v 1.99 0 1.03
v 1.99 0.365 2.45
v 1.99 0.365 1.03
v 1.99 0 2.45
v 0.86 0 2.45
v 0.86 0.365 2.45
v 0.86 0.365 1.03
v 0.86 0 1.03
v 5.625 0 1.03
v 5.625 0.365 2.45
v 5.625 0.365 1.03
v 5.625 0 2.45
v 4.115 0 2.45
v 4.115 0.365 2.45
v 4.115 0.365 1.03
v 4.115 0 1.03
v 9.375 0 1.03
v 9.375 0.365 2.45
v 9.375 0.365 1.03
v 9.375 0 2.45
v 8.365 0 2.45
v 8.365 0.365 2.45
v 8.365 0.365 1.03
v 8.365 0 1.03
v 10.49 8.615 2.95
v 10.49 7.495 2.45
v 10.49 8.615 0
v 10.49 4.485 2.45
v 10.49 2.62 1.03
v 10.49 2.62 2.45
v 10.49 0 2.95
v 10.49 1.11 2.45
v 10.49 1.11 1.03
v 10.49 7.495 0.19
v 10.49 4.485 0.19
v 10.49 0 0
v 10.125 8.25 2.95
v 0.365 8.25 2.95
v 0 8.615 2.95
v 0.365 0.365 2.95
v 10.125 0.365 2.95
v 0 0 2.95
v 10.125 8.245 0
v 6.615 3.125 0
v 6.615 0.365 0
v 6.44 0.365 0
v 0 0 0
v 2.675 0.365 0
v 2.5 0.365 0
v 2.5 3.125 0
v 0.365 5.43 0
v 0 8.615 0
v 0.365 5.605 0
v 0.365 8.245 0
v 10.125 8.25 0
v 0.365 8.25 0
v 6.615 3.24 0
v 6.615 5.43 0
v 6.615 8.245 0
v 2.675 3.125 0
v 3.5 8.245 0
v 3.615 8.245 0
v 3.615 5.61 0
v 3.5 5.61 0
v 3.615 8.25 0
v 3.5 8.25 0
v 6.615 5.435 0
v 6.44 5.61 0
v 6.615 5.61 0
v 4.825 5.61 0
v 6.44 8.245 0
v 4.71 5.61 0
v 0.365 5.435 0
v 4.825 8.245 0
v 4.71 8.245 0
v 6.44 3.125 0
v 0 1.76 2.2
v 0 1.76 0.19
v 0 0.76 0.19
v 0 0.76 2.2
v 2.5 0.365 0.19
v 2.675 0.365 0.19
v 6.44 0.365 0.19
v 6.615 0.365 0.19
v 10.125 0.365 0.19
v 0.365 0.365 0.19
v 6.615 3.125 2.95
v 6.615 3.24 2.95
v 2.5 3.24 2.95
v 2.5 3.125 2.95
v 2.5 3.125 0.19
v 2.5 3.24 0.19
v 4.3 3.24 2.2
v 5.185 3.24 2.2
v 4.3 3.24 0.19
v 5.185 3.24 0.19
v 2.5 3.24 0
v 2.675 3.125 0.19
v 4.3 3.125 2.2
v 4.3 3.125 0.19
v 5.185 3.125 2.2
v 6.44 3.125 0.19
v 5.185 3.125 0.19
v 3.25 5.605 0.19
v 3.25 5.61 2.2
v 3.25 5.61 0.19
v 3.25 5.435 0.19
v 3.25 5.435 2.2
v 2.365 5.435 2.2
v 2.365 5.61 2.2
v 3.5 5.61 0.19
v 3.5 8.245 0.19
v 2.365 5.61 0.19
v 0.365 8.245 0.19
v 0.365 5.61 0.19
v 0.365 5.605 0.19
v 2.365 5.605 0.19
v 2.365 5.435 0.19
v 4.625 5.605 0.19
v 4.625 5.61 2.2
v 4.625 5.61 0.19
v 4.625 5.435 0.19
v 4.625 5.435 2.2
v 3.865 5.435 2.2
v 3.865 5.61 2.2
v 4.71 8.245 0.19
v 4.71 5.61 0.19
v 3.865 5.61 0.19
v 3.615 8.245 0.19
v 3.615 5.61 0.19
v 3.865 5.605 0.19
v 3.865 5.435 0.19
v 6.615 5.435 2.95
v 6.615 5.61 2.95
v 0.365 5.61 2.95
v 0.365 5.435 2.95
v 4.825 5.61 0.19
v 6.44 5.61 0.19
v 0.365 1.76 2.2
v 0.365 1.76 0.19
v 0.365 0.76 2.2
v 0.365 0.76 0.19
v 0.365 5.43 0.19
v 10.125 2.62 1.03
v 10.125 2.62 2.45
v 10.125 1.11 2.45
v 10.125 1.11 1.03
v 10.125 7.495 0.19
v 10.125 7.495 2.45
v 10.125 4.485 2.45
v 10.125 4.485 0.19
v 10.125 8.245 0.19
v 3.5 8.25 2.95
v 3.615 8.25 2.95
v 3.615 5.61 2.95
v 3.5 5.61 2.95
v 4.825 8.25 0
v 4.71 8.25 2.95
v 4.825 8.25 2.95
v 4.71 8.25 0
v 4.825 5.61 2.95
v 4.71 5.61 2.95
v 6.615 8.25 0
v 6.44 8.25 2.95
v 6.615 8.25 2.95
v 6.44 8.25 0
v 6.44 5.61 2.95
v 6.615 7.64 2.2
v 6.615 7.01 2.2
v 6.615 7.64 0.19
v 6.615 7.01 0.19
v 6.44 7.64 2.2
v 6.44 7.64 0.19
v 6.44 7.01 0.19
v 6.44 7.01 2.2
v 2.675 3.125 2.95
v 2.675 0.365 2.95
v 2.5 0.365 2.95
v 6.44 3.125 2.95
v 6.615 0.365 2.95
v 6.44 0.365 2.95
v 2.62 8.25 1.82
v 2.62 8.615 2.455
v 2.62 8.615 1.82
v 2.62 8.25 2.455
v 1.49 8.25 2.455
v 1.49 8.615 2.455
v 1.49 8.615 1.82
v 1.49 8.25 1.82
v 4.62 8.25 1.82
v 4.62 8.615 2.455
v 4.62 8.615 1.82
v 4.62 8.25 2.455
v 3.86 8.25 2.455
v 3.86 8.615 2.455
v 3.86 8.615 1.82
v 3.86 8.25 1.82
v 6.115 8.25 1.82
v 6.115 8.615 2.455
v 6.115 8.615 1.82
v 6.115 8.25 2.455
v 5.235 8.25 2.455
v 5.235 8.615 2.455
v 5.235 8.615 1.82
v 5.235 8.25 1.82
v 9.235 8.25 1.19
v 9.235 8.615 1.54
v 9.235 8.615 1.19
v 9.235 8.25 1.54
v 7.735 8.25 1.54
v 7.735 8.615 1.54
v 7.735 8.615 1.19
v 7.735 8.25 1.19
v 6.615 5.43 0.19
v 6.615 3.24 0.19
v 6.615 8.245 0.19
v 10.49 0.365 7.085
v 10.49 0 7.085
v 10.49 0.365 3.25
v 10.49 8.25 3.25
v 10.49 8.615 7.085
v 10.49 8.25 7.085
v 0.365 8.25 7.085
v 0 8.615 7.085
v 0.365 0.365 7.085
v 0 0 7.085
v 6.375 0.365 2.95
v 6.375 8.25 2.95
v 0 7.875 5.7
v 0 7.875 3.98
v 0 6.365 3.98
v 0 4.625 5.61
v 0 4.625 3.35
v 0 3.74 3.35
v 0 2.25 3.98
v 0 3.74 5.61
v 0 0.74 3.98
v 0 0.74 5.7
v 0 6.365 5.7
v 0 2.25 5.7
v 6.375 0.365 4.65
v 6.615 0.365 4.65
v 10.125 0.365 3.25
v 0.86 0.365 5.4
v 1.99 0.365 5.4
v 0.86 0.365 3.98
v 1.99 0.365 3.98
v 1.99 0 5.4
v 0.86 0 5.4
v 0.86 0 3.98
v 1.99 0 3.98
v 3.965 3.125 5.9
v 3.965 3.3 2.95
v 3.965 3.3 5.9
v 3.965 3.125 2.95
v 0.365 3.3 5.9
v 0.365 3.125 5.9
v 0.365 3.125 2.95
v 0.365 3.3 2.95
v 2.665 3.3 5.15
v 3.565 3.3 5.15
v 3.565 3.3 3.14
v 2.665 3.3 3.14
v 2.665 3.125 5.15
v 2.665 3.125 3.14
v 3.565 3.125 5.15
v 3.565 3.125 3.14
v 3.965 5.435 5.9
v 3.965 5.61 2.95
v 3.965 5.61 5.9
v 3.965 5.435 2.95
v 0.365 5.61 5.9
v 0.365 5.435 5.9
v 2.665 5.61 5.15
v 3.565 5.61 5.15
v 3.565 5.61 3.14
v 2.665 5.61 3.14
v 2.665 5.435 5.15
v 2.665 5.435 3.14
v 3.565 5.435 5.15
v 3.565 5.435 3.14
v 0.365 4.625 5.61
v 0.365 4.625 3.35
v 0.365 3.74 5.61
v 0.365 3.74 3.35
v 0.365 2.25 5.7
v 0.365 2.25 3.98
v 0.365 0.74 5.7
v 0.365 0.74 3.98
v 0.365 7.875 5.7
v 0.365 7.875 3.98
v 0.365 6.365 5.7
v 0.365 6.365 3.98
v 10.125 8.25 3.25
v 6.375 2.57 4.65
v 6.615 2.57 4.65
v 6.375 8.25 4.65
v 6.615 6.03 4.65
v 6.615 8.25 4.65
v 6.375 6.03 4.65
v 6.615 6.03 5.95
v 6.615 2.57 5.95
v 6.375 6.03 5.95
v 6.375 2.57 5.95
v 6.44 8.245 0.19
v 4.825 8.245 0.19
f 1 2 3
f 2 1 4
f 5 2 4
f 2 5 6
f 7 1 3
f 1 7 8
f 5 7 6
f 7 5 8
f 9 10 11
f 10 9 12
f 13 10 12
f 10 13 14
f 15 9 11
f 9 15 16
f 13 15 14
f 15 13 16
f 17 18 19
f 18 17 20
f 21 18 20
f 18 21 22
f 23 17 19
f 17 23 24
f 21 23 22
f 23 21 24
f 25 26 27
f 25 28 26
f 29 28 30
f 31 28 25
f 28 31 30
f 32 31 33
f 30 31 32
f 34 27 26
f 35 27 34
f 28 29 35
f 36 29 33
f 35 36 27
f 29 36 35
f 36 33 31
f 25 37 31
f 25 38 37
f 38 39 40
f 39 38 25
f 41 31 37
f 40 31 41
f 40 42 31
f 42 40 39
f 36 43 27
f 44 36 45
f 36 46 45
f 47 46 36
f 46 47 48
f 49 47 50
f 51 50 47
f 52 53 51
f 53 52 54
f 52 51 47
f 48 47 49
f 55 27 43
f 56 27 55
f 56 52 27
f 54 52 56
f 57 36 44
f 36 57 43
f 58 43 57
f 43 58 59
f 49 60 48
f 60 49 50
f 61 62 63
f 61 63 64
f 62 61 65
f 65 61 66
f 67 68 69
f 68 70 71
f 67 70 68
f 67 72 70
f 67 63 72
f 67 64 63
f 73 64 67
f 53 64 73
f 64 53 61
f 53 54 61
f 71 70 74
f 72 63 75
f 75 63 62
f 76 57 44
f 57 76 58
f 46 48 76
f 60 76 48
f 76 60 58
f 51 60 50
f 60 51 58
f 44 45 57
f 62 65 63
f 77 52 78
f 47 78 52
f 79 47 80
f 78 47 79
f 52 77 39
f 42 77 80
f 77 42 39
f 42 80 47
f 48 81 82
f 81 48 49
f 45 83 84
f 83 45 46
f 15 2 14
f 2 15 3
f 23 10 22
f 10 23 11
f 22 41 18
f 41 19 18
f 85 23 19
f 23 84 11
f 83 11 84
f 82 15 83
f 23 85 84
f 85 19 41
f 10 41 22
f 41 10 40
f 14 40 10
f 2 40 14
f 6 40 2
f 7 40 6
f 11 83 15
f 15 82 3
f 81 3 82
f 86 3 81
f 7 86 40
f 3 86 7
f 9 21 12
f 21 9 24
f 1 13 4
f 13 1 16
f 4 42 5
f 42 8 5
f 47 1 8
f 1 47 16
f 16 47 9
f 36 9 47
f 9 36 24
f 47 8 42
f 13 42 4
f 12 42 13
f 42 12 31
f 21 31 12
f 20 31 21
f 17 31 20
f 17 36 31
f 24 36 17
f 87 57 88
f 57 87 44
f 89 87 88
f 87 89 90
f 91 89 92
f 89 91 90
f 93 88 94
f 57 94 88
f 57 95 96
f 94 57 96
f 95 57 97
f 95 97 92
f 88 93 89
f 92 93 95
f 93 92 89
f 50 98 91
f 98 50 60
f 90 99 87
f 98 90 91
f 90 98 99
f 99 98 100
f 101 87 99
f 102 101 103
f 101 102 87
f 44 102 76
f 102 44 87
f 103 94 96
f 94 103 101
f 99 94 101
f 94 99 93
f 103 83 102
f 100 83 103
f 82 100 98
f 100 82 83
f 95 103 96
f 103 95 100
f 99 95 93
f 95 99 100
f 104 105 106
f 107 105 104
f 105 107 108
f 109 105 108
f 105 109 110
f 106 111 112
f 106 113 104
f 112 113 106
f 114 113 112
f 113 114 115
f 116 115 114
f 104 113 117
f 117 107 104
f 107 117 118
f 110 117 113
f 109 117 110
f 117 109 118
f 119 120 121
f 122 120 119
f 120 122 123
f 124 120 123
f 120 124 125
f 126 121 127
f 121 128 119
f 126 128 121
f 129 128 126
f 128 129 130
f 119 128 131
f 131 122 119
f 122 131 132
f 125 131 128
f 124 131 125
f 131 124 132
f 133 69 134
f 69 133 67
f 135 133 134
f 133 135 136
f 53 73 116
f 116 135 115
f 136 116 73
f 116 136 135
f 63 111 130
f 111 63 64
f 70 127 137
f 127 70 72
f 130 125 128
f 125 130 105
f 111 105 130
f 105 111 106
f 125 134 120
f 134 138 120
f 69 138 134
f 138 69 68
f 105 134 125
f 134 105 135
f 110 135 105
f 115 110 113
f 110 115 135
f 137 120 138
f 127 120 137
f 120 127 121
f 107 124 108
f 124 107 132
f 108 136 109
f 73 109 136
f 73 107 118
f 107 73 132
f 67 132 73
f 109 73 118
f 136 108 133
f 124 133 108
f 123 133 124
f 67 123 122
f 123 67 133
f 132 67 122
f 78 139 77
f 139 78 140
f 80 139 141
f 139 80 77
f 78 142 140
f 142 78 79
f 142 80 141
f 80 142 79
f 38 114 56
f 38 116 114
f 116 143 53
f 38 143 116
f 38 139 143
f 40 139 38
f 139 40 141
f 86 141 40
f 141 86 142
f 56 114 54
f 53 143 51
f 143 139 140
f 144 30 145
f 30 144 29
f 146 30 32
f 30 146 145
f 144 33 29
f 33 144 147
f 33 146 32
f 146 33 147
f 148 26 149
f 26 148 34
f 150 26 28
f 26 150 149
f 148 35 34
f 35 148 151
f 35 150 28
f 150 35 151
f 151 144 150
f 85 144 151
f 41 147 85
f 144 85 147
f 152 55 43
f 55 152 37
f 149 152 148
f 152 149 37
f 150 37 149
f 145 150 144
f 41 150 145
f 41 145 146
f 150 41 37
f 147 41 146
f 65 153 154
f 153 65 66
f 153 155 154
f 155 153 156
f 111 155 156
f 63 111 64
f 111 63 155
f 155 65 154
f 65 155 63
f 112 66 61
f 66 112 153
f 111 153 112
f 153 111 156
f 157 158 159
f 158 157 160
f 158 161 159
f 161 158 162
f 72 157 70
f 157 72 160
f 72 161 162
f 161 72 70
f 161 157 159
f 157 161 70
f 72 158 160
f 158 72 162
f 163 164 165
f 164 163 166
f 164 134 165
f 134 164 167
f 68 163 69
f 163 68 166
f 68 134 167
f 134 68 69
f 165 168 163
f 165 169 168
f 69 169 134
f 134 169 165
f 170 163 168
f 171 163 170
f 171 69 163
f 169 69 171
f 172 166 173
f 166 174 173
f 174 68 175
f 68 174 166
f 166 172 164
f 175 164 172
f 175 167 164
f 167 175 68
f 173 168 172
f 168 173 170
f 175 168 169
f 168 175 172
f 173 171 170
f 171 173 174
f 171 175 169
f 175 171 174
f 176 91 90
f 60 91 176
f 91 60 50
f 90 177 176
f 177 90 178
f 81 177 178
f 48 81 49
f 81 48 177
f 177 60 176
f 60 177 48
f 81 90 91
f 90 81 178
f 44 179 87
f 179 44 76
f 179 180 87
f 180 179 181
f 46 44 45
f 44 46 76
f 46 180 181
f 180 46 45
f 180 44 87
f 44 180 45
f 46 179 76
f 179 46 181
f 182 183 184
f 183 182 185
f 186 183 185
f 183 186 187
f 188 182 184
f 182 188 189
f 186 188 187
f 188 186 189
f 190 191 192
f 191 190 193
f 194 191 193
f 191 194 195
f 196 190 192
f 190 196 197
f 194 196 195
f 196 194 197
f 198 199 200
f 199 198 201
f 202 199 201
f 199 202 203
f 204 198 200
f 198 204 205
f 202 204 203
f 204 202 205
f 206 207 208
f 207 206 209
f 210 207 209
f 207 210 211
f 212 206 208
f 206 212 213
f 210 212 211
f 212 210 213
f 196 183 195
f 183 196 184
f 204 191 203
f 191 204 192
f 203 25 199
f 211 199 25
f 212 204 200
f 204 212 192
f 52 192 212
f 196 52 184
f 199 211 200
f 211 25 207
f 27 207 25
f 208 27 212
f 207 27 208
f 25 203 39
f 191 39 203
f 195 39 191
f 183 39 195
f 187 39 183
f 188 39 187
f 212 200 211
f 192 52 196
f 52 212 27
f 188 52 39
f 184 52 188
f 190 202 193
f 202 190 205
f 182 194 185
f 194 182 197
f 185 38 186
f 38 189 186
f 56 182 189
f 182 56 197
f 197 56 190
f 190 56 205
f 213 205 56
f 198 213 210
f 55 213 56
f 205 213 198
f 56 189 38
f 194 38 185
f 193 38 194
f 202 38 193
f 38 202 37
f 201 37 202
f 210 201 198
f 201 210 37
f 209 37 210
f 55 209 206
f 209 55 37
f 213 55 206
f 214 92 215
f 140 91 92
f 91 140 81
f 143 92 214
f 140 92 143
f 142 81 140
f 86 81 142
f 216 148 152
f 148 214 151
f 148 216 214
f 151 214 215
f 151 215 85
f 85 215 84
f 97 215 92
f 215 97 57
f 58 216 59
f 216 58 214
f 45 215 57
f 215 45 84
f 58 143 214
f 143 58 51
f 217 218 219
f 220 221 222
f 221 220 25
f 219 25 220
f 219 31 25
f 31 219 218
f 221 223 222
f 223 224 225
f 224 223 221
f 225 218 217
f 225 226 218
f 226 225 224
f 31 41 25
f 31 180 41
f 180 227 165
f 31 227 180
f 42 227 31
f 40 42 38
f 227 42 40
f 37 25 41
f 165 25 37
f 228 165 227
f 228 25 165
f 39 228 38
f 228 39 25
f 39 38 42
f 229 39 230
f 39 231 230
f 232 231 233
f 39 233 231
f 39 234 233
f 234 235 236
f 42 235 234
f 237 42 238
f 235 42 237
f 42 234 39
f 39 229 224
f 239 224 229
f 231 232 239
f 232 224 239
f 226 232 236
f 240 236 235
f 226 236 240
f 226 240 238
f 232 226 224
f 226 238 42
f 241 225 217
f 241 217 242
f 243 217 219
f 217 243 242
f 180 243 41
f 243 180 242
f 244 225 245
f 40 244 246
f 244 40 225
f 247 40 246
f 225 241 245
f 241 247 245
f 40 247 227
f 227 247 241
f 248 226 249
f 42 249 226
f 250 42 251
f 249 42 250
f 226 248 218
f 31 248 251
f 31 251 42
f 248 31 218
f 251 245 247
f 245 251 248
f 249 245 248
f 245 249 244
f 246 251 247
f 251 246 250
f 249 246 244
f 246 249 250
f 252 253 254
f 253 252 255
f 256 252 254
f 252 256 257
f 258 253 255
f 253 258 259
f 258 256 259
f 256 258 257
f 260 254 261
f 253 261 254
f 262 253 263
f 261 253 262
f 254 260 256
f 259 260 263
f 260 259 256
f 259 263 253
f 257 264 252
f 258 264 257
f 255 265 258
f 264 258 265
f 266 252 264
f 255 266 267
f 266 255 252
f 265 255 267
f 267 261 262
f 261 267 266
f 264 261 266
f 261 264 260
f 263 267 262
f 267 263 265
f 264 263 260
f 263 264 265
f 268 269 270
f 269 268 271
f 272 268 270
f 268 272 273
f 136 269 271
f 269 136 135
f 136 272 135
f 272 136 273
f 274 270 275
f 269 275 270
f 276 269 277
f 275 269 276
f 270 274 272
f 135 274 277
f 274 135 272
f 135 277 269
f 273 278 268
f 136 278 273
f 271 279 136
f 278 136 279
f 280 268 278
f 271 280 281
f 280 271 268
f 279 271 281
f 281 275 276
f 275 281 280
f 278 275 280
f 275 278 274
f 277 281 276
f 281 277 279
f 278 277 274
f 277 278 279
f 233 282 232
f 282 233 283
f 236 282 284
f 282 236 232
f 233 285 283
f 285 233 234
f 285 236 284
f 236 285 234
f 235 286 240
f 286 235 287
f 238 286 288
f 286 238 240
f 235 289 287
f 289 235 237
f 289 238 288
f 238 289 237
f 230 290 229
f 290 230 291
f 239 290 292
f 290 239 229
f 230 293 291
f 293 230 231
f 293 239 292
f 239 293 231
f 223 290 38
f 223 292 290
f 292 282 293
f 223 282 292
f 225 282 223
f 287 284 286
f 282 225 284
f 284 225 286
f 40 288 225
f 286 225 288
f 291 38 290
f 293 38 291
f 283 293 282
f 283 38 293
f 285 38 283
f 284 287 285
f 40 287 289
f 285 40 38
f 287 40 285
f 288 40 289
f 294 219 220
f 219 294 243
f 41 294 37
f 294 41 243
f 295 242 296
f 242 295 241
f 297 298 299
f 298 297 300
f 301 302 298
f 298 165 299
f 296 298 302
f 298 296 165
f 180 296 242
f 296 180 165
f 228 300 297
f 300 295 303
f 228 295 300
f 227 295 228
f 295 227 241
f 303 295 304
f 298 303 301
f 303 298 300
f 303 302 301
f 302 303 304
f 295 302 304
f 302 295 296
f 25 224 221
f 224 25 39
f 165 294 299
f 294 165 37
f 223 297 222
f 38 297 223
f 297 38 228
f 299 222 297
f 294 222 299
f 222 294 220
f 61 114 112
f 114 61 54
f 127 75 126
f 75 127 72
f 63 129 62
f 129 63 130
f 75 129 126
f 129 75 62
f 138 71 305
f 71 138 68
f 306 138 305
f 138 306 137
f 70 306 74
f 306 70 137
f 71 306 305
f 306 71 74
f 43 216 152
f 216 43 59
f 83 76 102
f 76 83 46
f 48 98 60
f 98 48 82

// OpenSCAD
// file: OG.scad
include <HausCommon.scad>;

translate([0,0, WALL_HEIGHT]) {

difference() {
    group() {
max_wall_height = 4.135;

// Südseite
outer_wall(10.49, 0, 0, max_wall_height) {
    // Fenster Arbeitszimmer
    window(1.13, 0.86, 1.42);
}

thick_inner_wall(3.6, 0.0, 2.76) {
    door(2.3, 0.9);

}
thick_inner_wall(3.6, 0.0, 5.07) {
    door(2.3, 0.9);
}

horizontal() {
    // Westseite
    outer_wall(8.61, 0, 0, max_wall_height) {
        window(0.885, 3.74, 2.26, 3.16 - WALL_HEIGHT);
        window(1.51, 0.74, 1.72);
        window(1.51, 8.615 - 0.74 - 1.51, 1.72);
    }

    // Ostseite
    outer_wall(8.61, 0, 10.125, 0.30) {
    }
        // Ostseite
    wall(8.61, 0.24, 0, 6.01 + 0.365, 1.7) {
    }

        // Ostseite
    wall(3.46, 0.24, 2.57, 6.01 + 0.365, 3.0) {
    }
    
    
}


// Nordseite
outer_wall(10.49, 0, 8.615 - OUTER_WALL_THICKNESS, max_wall_height) {
}

} 

/*
difference() {
translate([-0.3,-0.3,4.23])     rotate([0,20,0]) 
#cube([12.0, 8.61 + 0.3 + 0.3,5.3]);
    translate([0.365 + 0.2,2.575, 1.5]) #cube([6.0, 3.46, 6.0]);
}
}

difference() {
translate([-0.3,-0.3,4.23])     rotate([0,20,0]) 
#cube([12.0, 8.61 + 0.3 + 0.3,0.3]);
    translate([0.365 + 0.2,2.575, 1.5]) #cube([6.0, 3.46, 6.0]);
}
    translate([-0.0,-0.25 + 2.575,4.03])     rotate([0,9,0])
#cube([7.0, 3.46 + 0.25 + 0.25,0.3]); */
}

}
// file: EG.scad
include <HausCommon.scad>;

// Südseite
outer_wall(10.49, 0) {
    // Fenster Flur
    window(1.13, 0.86, 1.42);
    
    // Fenster Arbeitszimmer
    window(1.51, 4.115, 1.42);
    
    // Fenster Wohnzimmer
    window(1.01, 4.115 + 1.51 + 2.74, 1.42);
}

thin_inner_wall(3.765 + 0.175*2, 2.135, 2.76) {
    door(1.8);

}
thick_inner_wall(2.135 + 0.175 + 3.765 + 0.175, 0.0, 5.07) {
    door(2.0);
    door(3.50, 0.76);

}

horizontal() {
    // Westseite
    outer_wall(8.61, 0, 0) {
        door(0.76, 1.0);
        window(0.885, 3.74, 2.26, 3.16);
    }

    // Ostseite
    outer_wall(8.61, 0, 10.125) {
        // Wohnzimmerfenster
        window(1.51, 1.11, 1.42);
        // Terrassentür
        door(1.11 + 1.51 + 1.865, 3.01, 2.26);
    }

    thin_inner_wall(2.64, 5.07 + 0.175, 3.135);
    thin_inner_wall(2.64, 5.07 + 0.175, 3.135 + 1.095 + 0.115);
    thick_inner_wall(2.64, 5.07 + 0.175, 3.135 + 1.095 + 0.115*2 + 1.615) {
        door(1.4, 0.63);
    }
    
    thick_inner_wall(2.76, 0.0, 2.135);
    thick_inner_wall(2.76, 0.0, 2.135 + 3.765 + 0.175);
}



// Nordseite
outer_wall(10.49, 0, 8.615 - OUTER_WALL_THICKNESS) {
    // Fenster HWR
    window(1.13, 1.49, 0.635, 1.63);
    
    // Fenster Gäste-WC
    window(0.76, 1.49 + 1.13 + 1.24, 0.635, 1.63);
    
    // Fenster Vorratskammer
    window(0.88, 1.49 + 1.13 + 1.24 + 0.76 + 0.615, 0.635, 1.63);
    
    // Küche Festverglasung
    window(1.50, 1.49 + 1.13 + 1.24 + 0.76 + 0.615 + 0.885 + 1.615, 0.35, 1.0);
}

// Flur
color("SaddleBrown") group() {
    ground(2.135, 2.76 + 0.115);
    ground(2.135 + 0.175 + 0.175 + 3.765, 2.19, 0, 2.76 + 0.115);
}

// HWR
color ("Silver") {
    ground(3.135, 2.64, 0, 2.76 + 0.115 + 2.19 + 0.175);
}

// Gäste WC
color ("Silver") {
    ground(1.095, 2.64, 3.135 + 0.115, 2.76 + 0.115 + 2.19 + 0.175);
}

// Vorratskammer
color ("Silver") {
    ground(1.615, 2.64, 3.135 + 0.115 + 0.115 + 1.095, 2.76 + 0.115 + 2.19 + 0.175);
}

// Küche
color ("Orange") {
    ground(3.51, 2.64 + 0.175, 3.135 + 0.115 + 0.115 + 1.095 + 1.615 + 0.175, 2.76 + 0.115 + 2.19);
}

// Wohnzimmer
color ("SaddleBrown") {
    ground(3.51, 5.07, 3.135 + 0.115 + 0.115 + 1.095 + 1.615 + 0.175, 0.0);
}

// Arbeitszimmer
color ("SaddleBrown") {
    ground(3.765, 2.76, 2.135 + 0.175, 0.0);
}
// file: HausCommon.scad
OUTER_WALL_THICKNESS = 0.365;
WALL_HEIGHT = 2.95;
THIN_INNER_WALL_THICKNESS = 0.115;
THICK_INNER_WALL_THICKNESS = 0.175;

DEFAULT_BRH = 0.84;
FLOOR_HEIGHT = 0.19;

module slot(width, shift, height, z) {
    translate([shift, -OUTER_WALL_THICKNESS*0.05, z])
        cube([width, OUTER_WALL_THICKNESS * 1.1, height]);
}

module window(width, shift, height = 0.54, brh = DEFAULT_BRH) {
    slot(width, shift, height, FLOOR_HEIGHT + brh); 
}

module door(shift, width = 0.885, height = 2.01) {
    slot(width, shift, height, FLOOR_HEIGHT);
}


module wall(width, thickness, shift_x = 0.0, shift_y = 0.0, height = WALL_HEIGHT) {
    translate([shift_x, shift_y, 0]) {
        difference() {
            cube([width, thickness, height]);
            children();
        }
    }
}

module outer_wall(width, shift_x = 0.0, shift_y = 0.0, height = WALL_HEIGHT) {
    color("Gray") wall(width, OUTER_WALL_THICKNESS, shift_x, shift_y, height) {
            children();
    }
}

module inner_wall(width, thickness, shift_x = 0.0, shift_y = 0.0) {
    color("White") translate([OUTER_WALL_THICKNESS, OUTER_WALL_THICKNESS,0])
        wall(width, thickness, shift_x, shift_y) {
            children();    
        }
    
}

module thick_inner_wall(width, shift_x = 0.0, shift_y = 0.0) {
    inner_wall(width, 0.175, shift_x, shift_y) {
        children();
    }
}

module thin_inner_wall(width, shift_x = 0.0, shift_y = 0.0) {
    inner_wall(width, 0.115, shift_x, shift_y) {
        children();
    }
}

module ground(width, height, shift_x = 0.0, shift_y = 0.0) {
    translate([OUTER_WALL_THICKNESS + shift_x, OUTER_WALL_THICKNESS + shift_y,0]) {
        cube([width, height, FLOOR_HEIGHT]);
    }
}


//function horizontal(f) = mirror([1,0,0]) rotate([0,0,90]);
//}

module horizontal() {
    Mvert = [ [ 0  , 1  , 0  , 0   ],
      [ 1  , 0  , 0  , 0   ],
      [ 0  , 0  , 1  , 0   ],
      [ 0  , 0  , 0  , 1   ] ] ;
    multmatrix(Mvert) { children(); }
} 
// main file
include <HausCommon.scad>;
include <EG.scad>;
include <OG.scad>;
